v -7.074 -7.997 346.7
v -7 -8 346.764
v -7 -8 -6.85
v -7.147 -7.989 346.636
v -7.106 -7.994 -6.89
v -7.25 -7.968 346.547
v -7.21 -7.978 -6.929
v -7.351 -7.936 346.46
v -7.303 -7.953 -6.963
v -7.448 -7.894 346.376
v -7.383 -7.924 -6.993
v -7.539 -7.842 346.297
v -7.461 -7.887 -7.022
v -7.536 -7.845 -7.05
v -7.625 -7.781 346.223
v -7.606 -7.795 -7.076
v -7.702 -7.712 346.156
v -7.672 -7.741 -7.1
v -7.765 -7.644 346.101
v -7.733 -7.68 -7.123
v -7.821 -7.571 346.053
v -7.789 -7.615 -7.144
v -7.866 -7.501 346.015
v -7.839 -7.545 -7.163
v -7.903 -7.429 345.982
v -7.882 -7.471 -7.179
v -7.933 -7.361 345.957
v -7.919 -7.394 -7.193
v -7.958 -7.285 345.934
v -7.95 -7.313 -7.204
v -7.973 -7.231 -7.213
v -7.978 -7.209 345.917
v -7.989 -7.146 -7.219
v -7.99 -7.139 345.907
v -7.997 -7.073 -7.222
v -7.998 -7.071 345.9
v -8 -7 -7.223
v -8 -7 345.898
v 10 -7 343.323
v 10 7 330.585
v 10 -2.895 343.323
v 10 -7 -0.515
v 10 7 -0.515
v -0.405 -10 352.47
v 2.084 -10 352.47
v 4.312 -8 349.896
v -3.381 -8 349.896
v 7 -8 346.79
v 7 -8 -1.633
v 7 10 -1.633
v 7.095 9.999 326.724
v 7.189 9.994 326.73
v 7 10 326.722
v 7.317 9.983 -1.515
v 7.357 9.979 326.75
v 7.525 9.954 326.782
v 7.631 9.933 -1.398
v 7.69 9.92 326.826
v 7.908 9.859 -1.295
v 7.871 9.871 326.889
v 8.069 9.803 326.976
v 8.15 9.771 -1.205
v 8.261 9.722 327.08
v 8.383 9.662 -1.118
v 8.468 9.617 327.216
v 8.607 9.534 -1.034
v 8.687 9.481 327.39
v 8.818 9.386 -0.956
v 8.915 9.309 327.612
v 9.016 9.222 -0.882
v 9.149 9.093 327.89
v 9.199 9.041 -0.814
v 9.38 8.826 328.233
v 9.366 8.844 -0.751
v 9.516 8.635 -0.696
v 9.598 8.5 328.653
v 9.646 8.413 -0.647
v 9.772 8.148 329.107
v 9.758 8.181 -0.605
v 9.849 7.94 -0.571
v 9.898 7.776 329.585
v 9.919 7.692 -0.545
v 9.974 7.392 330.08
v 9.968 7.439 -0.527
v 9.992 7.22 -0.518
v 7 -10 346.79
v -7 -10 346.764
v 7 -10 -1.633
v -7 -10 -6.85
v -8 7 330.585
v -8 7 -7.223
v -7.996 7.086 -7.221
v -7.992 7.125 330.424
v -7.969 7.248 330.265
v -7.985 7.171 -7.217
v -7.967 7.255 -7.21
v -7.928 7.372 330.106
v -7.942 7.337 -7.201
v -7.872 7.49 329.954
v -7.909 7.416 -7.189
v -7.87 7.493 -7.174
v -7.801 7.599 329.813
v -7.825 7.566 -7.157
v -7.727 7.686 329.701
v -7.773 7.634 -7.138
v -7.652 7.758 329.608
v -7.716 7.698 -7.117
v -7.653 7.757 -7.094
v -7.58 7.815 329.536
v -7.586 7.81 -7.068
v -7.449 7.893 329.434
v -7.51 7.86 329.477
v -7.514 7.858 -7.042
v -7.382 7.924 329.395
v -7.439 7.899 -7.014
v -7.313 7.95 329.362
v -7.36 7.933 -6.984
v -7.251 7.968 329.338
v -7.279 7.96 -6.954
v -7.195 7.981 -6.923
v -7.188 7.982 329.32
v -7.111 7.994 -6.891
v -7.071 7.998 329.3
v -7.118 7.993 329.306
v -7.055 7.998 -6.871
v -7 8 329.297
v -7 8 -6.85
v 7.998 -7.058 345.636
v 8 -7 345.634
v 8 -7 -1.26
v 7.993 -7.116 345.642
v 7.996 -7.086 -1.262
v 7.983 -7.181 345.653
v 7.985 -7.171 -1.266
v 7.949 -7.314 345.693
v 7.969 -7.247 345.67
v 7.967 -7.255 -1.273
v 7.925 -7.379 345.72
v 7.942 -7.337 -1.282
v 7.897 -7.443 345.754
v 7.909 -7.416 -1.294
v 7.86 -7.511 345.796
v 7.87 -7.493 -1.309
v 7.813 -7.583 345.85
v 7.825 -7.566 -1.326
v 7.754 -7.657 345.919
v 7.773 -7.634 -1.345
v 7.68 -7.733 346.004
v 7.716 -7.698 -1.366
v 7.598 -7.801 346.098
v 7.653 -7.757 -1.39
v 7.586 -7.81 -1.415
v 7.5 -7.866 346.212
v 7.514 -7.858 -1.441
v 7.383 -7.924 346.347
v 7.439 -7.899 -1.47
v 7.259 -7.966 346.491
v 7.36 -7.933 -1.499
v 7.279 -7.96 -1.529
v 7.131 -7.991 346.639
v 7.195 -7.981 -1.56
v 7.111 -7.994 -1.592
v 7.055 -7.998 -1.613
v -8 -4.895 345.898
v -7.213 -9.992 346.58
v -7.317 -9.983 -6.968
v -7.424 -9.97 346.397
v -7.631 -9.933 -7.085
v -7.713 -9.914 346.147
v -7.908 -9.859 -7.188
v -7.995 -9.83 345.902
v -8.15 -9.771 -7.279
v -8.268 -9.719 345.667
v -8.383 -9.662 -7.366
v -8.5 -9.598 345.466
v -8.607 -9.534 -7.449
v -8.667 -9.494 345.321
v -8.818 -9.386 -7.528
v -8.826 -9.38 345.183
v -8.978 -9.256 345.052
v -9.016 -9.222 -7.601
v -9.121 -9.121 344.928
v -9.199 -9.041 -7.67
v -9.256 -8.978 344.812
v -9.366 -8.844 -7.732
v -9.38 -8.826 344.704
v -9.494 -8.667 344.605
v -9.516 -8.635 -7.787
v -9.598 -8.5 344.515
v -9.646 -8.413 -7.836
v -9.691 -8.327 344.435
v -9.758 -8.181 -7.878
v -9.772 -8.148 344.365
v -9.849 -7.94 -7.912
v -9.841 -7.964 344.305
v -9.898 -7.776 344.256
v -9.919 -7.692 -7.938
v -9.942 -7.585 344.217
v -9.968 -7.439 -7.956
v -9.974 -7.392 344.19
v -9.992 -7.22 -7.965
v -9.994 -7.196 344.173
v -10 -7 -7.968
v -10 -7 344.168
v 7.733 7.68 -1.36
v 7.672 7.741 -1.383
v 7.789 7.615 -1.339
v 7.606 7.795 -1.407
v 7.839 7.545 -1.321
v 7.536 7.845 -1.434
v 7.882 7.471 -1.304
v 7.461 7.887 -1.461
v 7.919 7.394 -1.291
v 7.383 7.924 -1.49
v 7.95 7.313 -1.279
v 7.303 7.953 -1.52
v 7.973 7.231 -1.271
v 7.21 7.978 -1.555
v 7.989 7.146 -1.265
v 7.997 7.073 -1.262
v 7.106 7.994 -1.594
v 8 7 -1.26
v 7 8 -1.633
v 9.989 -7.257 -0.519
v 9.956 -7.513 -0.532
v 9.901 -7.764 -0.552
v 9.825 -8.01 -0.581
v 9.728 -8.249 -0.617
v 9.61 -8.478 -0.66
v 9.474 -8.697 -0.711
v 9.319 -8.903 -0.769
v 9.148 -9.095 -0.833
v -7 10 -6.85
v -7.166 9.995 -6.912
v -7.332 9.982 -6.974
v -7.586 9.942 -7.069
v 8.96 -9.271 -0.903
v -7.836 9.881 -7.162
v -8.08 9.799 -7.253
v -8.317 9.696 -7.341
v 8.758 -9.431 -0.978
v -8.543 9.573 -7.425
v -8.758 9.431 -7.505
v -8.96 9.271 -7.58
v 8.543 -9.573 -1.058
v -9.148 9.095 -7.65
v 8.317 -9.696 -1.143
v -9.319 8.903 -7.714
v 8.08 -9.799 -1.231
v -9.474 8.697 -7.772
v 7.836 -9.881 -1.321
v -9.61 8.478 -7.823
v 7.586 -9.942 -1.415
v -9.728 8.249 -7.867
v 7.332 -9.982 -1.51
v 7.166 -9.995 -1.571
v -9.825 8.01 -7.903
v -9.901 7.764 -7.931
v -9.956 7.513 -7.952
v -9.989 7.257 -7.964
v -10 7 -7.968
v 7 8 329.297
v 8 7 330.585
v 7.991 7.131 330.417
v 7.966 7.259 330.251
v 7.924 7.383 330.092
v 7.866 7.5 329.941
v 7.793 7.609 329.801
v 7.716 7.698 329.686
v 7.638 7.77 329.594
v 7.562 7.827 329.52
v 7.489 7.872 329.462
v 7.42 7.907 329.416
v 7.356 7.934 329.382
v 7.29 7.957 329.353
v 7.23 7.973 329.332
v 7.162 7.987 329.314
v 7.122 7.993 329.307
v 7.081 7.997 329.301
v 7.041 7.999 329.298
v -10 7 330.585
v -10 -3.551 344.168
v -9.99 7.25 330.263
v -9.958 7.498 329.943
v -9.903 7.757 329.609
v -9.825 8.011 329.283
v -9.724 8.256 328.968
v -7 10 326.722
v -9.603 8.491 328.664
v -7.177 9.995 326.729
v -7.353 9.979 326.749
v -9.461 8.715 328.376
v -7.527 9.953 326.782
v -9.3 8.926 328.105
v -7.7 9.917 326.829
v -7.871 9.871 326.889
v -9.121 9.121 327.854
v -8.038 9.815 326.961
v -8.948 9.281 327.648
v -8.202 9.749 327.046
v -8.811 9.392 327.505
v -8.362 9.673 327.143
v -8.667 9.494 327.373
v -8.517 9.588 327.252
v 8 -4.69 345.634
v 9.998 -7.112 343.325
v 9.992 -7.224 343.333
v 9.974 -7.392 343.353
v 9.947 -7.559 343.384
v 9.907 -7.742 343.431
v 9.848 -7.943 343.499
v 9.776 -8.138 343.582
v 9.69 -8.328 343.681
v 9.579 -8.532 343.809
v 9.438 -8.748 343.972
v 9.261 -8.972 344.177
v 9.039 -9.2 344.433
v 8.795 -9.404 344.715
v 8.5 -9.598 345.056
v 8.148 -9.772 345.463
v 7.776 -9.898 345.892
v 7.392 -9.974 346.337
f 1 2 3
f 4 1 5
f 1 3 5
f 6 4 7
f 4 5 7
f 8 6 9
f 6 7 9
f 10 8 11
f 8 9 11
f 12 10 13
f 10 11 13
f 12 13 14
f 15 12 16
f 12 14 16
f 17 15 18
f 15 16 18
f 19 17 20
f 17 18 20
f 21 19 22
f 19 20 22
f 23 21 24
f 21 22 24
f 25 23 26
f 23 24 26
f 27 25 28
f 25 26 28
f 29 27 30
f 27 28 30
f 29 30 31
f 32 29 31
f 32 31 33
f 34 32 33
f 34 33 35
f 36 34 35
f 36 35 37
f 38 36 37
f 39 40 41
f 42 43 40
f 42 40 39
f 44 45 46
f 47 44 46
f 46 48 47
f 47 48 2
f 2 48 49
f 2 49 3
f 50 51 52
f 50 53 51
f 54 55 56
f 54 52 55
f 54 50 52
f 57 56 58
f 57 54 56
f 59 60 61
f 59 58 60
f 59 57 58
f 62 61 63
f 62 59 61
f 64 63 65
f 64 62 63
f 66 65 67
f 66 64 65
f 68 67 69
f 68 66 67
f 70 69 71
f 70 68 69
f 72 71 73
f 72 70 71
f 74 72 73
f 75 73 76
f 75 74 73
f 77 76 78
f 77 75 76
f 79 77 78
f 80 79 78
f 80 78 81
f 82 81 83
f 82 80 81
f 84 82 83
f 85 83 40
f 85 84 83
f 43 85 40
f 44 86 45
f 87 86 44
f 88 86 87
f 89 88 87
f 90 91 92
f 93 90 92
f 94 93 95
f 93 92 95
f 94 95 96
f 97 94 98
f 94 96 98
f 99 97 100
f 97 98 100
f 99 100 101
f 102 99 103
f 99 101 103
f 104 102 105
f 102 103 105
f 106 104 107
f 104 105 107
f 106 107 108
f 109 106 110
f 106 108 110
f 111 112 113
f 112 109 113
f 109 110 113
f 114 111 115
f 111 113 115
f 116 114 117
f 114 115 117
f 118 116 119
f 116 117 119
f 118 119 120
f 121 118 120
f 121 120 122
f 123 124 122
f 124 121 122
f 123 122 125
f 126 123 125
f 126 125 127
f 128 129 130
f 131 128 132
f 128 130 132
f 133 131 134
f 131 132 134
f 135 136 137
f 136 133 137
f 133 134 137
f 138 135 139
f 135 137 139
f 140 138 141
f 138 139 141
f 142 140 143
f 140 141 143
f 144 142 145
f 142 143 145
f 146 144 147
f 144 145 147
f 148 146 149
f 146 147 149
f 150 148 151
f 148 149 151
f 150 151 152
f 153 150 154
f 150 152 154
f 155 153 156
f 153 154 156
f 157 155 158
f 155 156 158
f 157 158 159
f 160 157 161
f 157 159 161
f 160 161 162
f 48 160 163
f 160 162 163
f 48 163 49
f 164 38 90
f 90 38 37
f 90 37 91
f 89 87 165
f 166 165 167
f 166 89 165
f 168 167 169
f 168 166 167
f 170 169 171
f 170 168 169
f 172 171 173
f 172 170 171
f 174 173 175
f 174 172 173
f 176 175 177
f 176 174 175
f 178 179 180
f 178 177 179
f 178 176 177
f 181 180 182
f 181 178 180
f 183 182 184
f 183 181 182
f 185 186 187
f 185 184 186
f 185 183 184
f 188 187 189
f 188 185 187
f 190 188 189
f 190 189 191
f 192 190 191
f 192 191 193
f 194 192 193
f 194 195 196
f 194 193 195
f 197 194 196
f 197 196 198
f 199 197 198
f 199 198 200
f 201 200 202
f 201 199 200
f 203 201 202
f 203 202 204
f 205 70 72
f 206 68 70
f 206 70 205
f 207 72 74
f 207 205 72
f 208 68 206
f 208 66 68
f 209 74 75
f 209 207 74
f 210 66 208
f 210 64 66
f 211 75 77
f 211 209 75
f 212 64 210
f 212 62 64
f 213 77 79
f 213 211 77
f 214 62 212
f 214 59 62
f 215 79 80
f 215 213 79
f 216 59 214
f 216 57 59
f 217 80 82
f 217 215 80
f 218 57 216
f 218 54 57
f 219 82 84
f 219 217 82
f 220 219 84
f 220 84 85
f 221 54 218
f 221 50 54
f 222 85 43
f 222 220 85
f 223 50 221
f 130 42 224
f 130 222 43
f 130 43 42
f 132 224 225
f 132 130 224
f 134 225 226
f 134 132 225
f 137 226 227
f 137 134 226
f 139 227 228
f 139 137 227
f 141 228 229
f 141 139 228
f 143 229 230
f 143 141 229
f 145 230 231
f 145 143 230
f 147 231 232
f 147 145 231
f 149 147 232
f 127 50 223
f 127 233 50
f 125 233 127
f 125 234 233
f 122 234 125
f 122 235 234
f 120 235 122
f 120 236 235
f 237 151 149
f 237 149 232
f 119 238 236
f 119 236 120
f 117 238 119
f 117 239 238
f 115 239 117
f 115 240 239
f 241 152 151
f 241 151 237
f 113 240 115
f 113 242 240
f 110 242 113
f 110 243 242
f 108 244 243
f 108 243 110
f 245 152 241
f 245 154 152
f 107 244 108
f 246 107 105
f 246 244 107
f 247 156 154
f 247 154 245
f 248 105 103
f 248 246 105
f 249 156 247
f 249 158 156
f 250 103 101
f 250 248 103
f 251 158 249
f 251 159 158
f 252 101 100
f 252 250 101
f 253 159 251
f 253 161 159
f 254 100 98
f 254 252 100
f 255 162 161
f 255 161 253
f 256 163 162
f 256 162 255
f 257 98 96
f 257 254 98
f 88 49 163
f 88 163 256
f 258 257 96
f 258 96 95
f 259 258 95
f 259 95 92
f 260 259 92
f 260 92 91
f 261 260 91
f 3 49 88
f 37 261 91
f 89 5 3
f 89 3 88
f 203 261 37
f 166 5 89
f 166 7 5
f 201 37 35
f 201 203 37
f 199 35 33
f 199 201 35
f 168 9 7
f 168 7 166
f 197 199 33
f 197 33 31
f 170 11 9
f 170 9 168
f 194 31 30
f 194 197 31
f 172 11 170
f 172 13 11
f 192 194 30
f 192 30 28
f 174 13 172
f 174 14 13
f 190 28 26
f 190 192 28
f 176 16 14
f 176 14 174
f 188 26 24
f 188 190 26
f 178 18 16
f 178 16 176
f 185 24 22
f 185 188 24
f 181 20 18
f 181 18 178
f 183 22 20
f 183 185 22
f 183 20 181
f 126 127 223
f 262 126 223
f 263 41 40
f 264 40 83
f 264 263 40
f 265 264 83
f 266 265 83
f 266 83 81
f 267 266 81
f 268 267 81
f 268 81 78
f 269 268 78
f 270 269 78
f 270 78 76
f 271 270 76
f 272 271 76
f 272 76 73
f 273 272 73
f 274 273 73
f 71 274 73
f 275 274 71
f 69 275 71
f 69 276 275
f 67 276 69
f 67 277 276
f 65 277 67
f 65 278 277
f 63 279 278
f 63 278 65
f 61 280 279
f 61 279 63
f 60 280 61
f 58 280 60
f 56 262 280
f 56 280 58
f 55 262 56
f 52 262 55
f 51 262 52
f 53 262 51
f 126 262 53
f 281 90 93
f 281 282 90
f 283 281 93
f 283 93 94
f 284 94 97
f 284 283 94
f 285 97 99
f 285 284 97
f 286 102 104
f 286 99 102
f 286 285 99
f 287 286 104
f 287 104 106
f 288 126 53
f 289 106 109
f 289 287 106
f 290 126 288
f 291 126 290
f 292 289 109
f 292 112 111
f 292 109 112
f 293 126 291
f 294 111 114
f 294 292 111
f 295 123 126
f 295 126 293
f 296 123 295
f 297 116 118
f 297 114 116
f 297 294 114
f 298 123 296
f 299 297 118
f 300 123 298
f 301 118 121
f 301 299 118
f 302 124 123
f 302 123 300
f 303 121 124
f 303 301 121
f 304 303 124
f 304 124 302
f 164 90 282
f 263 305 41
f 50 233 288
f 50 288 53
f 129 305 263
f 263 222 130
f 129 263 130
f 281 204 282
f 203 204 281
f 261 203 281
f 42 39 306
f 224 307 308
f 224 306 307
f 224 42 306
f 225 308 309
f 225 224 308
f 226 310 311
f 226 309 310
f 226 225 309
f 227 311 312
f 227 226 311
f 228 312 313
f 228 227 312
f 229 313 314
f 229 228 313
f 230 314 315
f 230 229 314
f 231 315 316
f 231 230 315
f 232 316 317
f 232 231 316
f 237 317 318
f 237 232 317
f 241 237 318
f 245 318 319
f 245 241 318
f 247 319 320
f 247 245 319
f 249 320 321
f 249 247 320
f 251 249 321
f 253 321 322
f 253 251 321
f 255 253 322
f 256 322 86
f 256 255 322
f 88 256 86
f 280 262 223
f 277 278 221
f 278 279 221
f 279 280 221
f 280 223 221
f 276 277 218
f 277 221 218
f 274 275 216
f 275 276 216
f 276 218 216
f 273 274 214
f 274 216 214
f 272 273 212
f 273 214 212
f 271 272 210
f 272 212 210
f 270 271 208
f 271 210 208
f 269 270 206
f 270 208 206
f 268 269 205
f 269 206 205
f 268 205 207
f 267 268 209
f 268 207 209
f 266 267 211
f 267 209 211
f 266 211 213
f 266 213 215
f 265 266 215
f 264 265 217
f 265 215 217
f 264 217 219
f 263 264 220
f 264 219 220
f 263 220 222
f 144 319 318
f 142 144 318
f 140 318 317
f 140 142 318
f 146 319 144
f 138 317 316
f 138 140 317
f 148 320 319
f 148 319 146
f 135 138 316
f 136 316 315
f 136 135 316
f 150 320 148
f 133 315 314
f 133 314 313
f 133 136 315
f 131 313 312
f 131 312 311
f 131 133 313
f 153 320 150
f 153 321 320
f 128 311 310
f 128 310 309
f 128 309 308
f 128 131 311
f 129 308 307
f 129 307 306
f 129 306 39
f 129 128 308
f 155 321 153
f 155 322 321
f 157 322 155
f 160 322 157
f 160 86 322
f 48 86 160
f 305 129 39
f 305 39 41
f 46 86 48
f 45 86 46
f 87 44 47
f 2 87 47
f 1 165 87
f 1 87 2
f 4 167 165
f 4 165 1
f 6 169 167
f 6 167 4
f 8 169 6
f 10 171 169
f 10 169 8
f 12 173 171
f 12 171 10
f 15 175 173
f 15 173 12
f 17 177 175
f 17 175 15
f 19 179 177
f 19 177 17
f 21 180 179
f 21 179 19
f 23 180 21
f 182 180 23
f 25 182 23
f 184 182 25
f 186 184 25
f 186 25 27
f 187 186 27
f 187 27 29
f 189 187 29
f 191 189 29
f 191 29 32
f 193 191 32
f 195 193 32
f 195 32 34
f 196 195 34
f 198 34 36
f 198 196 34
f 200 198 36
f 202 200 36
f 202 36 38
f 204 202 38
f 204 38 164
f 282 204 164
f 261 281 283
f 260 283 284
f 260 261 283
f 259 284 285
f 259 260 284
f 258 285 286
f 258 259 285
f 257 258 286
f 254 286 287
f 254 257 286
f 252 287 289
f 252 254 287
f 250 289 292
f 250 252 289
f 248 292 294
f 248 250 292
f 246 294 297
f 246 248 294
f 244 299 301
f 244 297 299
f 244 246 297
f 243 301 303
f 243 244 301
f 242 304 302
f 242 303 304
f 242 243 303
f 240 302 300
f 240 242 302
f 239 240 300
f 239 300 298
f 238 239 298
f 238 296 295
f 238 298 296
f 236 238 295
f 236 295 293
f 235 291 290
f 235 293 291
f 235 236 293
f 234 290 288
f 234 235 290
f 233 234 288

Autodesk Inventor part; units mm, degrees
ref_plane "Start Plane" through (0, 0, -7.968) normal (0, 0, 1) x (1, 0, 0)
ref_plane "End Plane" through (0, 0, 352.4706) normal (0, 0, 1) x (1, 0, 0)
sketch "Sketch" plane through (0, 0, 0) normal (0, 0, 1) x (1, 0, 0)
  line L0 (-10, -7) -> (-10, 7)
  line L1 (-7, 10) -> (7, 10)
  line L2 (10, 7) -> (10, -7)
  line L3 (7, -10) -> (-7, -10)
  arc A0 (-10, -7) -> (-7, -10) centre (-7, -7) ccw
  arc A1 (-7, 10) -> (-10, 7) centre (-7, 7) ccw
  arc A2 (10, 7) -> (7, 10) centre (7, 7) ccw
  arc A3 (7, -10) -> (10, -7) centre (7, -7) ccw
  arc A4 (-7, 8) -> (-8, 7) centre (-7, 7) ccw
  line L4 (-7, 8) -> (7, 8)
  arc A5 (8, 7) -> (7, 8) centre (7, 7) ccw
  line L5 (8, 7) -> (8, -7)
  arc A6 (7, -8) -> (8, -7) centre (7, -7) ccw
  line L6 (7, -8) -> (-7, -8)
  arc A7 (-8, -7) -> (-7, -8) centre (-7, -7) ccw
  line L7 (-8, -7) -> (-8, 7)
  line L8 (0, 14.8698) -> (0, -14.8698) construction
  line L9 (-14.8698, 0) -> (14.8698, 0) construction
  dimension "d7" = 3
  dimension "d10" = 20
  dimension "d11" = 20
  dimension "d12" = 2
  dimension "d15" = 10
  dimension "d16" = 10
extrude "Body" add sketch "Sketch" along normal up to surface (360.4385 mm away) from surface at -7.968
sketch "Sketch3" plane through (0, 0, 0) normal (0, 0, 1) x (1, 0, 0)
  line L0 (0, 0) -> (10, 0)
ref_plane "Work Plane3" through (0, 0, 0) normal (0, -1, 0) x (1, 0, 0)
sketch "Sketch4" plane through (0, 0, 0) normal (0, -1, 0) x (1, 0, 0)
  line L0 (-2, -7.968) -> (12, -7.968)
  line L1 (-2, 352.4706) -> (12, 352.4706)
  dimension "d18" = 360.4385
ref_plane "Work Plane4" through (-10, 0, -7.968) normal (0.3492, 0, -0.9371) x (-0.9371, 0, -0.3492)
split "Split1" plane through (-10, 0, -7.968) removes the side toward (0.3492, 0, -0.9371)
ref_plane "Work Plane5" through (0, -10, 352.4706) normal (0, 0.7897, 0.6134) x (1, 0, 0)
split "Split2" plane through (0, -10, 352.4706) removes the side toward (0, 0.7897, 0.6134)
ref_plane "Work Plane6" through (12.1423, 0, 340.8474) normal (0.7562, 0, 0.6544) x (0.6544, 0, -0.7562)
split "Split3" plane through (12.1423, 0, 340.8474) removes the side toward (0.7562, 0, 0.6544)
ref_plane "Work Plane7" through (-1.2506, 0, 351.7391) normal (-0.6544, 0, 0.7562) x (0.7562, 0, 0.6544)
split "Split4" plane through (-1.2506, 0, 351.7391) removes the side toward (-0.6544, 0, 0.7562)
equation "\"d7\" = G_IR"
equation "\"d10\" = G_H"
equation "\"d11\" = G_W"
equation "\"d12\" = G_T"
equation "\"d15\" = 0.5 * d10"
equation "\"d16\" = 0.5 * d11"
equation "\"d3\" = G_L"
equation "\"G_W\" = 20"
equation "\"G_H\" = 20"
equation "\"G_T\" = 2"
equation "\"G_IR\" = 3"
equation "\"G_L\" = d18"
equation "\"G_OFFSET_START\" = 7.96796"
equation "\"G_OFFSET_END\" = 12.87375"
equation "\"d13\" = -G_OFFSET_START"
equation "\"d14\" = G_OFFSET_END + B_L"
equation "\"B_L\" = 339.59682"
properties part number "ISO 12633-2 - 20x20x2 - 360,44  sideplan 1 bagerste stolpe" material "Steel, Mild"
